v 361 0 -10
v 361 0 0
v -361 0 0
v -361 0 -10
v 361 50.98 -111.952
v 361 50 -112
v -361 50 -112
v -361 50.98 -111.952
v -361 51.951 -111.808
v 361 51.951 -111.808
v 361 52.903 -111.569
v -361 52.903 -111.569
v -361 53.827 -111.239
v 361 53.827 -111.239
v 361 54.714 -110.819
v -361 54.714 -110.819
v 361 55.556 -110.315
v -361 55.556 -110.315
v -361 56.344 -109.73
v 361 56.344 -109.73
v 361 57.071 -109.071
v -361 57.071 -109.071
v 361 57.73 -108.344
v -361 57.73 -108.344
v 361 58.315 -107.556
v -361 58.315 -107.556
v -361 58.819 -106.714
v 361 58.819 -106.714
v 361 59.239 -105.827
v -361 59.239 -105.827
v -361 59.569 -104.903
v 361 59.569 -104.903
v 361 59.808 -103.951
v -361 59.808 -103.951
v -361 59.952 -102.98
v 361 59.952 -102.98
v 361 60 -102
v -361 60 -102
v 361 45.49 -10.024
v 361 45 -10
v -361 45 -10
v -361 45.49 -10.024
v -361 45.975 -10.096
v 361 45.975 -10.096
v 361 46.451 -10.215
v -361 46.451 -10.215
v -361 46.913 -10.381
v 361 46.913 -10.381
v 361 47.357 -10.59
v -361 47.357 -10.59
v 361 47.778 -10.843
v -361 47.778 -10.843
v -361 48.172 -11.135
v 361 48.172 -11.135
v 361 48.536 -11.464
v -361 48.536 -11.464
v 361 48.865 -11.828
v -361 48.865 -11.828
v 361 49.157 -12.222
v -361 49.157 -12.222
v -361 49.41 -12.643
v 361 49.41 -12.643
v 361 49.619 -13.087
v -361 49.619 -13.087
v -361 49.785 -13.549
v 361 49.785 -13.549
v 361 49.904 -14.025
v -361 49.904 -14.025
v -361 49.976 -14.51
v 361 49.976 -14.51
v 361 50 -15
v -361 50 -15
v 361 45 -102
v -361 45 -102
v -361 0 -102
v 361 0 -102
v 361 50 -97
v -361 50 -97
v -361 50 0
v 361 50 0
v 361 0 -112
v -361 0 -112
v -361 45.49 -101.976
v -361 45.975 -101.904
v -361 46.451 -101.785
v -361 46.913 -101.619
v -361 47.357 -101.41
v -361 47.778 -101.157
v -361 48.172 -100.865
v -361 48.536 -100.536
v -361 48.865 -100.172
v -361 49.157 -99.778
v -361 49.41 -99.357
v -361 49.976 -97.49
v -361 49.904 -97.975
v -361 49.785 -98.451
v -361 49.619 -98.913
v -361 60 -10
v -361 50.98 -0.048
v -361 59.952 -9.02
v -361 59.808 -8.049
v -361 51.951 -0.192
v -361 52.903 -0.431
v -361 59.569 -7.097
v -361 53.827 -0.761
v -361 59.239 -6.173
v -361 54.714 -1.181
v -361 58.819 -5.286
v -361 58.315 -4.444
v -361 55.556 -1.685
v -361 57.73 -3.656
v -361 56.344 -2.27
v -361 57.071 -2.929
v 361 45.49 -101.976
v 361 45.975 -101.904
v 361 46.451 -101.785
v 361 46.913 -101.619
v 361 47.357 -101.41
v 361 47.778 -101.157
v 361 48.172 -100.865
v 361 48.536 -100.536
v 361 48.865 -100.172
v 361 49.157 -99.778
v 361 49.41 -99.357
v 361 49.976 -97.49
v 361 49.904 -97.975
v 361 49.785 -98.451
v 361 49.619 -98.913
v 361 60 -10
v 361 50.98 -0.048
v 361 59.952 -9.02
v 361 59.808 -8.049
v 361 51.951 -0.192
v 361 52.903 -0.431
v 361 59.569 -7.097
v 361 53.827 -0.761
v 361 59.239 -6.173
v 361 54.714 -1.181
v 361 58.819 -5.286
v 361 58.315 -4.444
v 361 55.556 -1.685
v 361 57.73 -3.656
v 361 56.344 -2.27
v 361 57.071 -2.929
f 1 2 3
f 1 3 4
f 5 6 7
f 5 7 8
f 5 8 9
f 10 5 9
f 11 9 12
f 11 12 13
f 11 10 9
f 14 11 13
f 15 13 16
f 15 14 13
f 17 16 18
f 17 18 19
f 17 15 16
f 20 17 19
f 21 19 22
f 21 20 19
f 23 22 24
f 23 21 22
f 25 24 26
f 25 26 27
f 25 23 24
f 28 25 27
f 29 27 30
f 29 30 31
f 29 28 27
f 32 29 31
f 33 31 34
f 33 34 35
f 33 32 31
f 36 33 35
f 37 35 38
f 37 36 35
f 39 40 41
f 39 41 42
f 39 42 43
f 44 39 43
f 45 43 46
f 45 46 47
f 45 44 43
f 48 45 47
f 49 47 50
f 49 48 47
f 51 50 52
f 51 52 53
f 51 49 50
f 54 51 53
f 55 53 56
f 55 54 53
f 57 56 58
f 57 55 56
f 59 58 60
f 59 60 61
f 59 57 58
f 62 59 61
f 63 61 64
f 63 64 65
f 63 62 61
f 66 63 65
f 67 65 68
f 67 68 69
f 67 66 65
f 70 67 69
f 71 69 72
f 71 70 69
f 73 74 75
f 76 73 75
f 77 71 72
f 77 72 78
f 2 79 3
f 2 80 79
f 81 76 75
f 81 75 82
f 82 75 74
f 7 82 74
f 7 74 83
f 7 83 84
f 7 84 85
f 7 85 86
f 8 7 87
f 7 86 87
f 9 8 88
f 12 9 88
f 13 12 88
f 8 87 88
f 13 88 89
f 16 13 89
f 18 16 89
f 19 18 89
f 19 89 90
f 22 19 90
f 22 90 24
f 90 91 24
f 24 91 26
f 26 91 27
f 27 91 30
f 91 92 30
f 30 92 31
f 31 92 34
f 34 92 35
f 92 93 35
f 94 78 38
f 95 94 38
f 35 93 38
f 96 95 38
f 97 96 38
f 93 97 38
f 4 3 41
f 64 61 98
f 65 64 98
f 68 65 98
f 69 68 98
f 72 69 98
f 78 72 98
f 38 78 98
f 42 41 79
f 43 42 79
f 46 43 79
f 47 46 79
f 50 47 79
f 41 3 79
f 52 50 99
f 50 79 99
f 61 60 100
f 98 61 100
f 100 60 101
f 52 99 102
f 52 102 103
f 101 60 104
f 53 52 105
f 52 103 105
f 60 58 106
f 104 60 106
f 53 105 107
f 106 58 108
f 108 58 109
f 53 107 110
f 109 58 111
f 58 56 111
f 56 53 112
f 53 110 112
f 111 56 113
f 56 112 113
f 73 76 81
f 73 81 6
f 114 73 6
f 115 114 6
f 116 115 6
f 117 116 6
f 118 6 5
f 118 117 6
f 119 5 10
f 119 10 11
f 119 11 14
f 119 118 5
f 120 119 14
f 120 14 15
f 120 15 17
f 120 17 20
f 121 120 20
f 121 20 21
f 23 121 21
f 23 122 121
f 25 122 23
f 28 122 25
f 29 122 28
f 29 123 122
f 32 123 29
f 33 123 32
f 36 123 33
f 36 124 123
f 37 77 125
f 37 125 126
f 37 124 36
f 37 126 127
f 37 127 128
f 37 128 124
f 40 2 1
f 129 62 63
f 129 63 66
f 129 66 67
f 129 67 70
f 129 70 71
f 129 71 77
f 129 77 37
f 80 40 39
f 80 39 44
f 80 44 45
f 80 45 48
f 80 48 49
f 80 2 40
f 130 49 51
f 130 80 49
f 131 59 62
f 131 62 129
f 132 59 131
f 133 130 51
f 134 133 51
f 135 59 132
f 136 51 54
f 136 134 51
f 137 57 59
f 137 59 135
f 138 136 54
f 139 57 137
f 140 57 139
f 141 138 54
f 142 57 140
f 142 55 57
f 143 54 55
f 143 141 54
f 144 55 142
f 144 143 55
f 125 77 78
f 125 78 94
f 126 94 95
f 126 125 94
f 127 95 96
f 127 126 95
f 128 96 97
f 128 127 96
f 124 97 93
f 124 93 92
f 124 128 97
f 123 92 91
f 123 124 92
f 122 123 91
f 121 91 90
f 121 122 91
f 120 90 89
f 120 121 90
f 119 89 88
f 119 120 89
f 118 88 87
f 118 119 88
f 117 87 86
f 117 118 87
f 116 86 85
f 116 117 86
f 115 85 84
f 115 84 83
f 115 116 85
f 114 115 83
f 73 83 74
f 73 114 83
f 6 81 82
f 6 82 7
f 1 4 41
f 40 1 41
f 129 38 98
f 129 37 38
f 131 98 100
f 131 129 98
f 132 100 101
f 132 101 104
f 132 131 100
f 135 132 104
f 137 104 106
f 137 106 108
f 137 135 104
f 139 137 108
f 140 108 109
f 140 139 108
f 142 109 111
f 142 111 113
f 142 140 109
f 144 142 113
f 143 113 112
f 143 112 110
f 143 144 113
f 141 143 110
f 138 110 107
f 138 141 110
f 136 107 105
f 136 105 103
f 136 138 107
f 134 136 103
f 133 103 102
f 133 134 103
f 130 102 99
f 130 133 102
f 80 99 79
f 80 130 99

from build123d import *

# Parameters (mm, degrees)
F1_DEPTH = 361


with BuildPart() as f1:
    # F0 (on Right) → F1 (new body, symmetric)
    with BuildSketch(Plane.YZ):
        with BuildLine():
            Line((50, 0), (0, 0))
            Line((0, 0), (0, -10))
            Line((0, -10), (45, -10))
            ThreePointArc((45, -10), (48.535534, -11.464466), (50, -15))
            Line((50, -15), (50, -97))
            ThreePointArc((50, -97), (48.535534, -100.535534), (45, -102))
            Line((45, -102), (0, -102))
            Line((0, -102), (0, -112))
            Line((0, -112), (50, -112))
            ThreePointArc((50, -112), (57.071068, -109.071068), (60, -102))
            Line((60, -102), (60, -10))
            ThreePointArc((60, -10), (57.071068, -2.928932), (50, 0))
        make_face()
    extrude(amount=F1_DEPTH, both=True)


solid = f1.part
